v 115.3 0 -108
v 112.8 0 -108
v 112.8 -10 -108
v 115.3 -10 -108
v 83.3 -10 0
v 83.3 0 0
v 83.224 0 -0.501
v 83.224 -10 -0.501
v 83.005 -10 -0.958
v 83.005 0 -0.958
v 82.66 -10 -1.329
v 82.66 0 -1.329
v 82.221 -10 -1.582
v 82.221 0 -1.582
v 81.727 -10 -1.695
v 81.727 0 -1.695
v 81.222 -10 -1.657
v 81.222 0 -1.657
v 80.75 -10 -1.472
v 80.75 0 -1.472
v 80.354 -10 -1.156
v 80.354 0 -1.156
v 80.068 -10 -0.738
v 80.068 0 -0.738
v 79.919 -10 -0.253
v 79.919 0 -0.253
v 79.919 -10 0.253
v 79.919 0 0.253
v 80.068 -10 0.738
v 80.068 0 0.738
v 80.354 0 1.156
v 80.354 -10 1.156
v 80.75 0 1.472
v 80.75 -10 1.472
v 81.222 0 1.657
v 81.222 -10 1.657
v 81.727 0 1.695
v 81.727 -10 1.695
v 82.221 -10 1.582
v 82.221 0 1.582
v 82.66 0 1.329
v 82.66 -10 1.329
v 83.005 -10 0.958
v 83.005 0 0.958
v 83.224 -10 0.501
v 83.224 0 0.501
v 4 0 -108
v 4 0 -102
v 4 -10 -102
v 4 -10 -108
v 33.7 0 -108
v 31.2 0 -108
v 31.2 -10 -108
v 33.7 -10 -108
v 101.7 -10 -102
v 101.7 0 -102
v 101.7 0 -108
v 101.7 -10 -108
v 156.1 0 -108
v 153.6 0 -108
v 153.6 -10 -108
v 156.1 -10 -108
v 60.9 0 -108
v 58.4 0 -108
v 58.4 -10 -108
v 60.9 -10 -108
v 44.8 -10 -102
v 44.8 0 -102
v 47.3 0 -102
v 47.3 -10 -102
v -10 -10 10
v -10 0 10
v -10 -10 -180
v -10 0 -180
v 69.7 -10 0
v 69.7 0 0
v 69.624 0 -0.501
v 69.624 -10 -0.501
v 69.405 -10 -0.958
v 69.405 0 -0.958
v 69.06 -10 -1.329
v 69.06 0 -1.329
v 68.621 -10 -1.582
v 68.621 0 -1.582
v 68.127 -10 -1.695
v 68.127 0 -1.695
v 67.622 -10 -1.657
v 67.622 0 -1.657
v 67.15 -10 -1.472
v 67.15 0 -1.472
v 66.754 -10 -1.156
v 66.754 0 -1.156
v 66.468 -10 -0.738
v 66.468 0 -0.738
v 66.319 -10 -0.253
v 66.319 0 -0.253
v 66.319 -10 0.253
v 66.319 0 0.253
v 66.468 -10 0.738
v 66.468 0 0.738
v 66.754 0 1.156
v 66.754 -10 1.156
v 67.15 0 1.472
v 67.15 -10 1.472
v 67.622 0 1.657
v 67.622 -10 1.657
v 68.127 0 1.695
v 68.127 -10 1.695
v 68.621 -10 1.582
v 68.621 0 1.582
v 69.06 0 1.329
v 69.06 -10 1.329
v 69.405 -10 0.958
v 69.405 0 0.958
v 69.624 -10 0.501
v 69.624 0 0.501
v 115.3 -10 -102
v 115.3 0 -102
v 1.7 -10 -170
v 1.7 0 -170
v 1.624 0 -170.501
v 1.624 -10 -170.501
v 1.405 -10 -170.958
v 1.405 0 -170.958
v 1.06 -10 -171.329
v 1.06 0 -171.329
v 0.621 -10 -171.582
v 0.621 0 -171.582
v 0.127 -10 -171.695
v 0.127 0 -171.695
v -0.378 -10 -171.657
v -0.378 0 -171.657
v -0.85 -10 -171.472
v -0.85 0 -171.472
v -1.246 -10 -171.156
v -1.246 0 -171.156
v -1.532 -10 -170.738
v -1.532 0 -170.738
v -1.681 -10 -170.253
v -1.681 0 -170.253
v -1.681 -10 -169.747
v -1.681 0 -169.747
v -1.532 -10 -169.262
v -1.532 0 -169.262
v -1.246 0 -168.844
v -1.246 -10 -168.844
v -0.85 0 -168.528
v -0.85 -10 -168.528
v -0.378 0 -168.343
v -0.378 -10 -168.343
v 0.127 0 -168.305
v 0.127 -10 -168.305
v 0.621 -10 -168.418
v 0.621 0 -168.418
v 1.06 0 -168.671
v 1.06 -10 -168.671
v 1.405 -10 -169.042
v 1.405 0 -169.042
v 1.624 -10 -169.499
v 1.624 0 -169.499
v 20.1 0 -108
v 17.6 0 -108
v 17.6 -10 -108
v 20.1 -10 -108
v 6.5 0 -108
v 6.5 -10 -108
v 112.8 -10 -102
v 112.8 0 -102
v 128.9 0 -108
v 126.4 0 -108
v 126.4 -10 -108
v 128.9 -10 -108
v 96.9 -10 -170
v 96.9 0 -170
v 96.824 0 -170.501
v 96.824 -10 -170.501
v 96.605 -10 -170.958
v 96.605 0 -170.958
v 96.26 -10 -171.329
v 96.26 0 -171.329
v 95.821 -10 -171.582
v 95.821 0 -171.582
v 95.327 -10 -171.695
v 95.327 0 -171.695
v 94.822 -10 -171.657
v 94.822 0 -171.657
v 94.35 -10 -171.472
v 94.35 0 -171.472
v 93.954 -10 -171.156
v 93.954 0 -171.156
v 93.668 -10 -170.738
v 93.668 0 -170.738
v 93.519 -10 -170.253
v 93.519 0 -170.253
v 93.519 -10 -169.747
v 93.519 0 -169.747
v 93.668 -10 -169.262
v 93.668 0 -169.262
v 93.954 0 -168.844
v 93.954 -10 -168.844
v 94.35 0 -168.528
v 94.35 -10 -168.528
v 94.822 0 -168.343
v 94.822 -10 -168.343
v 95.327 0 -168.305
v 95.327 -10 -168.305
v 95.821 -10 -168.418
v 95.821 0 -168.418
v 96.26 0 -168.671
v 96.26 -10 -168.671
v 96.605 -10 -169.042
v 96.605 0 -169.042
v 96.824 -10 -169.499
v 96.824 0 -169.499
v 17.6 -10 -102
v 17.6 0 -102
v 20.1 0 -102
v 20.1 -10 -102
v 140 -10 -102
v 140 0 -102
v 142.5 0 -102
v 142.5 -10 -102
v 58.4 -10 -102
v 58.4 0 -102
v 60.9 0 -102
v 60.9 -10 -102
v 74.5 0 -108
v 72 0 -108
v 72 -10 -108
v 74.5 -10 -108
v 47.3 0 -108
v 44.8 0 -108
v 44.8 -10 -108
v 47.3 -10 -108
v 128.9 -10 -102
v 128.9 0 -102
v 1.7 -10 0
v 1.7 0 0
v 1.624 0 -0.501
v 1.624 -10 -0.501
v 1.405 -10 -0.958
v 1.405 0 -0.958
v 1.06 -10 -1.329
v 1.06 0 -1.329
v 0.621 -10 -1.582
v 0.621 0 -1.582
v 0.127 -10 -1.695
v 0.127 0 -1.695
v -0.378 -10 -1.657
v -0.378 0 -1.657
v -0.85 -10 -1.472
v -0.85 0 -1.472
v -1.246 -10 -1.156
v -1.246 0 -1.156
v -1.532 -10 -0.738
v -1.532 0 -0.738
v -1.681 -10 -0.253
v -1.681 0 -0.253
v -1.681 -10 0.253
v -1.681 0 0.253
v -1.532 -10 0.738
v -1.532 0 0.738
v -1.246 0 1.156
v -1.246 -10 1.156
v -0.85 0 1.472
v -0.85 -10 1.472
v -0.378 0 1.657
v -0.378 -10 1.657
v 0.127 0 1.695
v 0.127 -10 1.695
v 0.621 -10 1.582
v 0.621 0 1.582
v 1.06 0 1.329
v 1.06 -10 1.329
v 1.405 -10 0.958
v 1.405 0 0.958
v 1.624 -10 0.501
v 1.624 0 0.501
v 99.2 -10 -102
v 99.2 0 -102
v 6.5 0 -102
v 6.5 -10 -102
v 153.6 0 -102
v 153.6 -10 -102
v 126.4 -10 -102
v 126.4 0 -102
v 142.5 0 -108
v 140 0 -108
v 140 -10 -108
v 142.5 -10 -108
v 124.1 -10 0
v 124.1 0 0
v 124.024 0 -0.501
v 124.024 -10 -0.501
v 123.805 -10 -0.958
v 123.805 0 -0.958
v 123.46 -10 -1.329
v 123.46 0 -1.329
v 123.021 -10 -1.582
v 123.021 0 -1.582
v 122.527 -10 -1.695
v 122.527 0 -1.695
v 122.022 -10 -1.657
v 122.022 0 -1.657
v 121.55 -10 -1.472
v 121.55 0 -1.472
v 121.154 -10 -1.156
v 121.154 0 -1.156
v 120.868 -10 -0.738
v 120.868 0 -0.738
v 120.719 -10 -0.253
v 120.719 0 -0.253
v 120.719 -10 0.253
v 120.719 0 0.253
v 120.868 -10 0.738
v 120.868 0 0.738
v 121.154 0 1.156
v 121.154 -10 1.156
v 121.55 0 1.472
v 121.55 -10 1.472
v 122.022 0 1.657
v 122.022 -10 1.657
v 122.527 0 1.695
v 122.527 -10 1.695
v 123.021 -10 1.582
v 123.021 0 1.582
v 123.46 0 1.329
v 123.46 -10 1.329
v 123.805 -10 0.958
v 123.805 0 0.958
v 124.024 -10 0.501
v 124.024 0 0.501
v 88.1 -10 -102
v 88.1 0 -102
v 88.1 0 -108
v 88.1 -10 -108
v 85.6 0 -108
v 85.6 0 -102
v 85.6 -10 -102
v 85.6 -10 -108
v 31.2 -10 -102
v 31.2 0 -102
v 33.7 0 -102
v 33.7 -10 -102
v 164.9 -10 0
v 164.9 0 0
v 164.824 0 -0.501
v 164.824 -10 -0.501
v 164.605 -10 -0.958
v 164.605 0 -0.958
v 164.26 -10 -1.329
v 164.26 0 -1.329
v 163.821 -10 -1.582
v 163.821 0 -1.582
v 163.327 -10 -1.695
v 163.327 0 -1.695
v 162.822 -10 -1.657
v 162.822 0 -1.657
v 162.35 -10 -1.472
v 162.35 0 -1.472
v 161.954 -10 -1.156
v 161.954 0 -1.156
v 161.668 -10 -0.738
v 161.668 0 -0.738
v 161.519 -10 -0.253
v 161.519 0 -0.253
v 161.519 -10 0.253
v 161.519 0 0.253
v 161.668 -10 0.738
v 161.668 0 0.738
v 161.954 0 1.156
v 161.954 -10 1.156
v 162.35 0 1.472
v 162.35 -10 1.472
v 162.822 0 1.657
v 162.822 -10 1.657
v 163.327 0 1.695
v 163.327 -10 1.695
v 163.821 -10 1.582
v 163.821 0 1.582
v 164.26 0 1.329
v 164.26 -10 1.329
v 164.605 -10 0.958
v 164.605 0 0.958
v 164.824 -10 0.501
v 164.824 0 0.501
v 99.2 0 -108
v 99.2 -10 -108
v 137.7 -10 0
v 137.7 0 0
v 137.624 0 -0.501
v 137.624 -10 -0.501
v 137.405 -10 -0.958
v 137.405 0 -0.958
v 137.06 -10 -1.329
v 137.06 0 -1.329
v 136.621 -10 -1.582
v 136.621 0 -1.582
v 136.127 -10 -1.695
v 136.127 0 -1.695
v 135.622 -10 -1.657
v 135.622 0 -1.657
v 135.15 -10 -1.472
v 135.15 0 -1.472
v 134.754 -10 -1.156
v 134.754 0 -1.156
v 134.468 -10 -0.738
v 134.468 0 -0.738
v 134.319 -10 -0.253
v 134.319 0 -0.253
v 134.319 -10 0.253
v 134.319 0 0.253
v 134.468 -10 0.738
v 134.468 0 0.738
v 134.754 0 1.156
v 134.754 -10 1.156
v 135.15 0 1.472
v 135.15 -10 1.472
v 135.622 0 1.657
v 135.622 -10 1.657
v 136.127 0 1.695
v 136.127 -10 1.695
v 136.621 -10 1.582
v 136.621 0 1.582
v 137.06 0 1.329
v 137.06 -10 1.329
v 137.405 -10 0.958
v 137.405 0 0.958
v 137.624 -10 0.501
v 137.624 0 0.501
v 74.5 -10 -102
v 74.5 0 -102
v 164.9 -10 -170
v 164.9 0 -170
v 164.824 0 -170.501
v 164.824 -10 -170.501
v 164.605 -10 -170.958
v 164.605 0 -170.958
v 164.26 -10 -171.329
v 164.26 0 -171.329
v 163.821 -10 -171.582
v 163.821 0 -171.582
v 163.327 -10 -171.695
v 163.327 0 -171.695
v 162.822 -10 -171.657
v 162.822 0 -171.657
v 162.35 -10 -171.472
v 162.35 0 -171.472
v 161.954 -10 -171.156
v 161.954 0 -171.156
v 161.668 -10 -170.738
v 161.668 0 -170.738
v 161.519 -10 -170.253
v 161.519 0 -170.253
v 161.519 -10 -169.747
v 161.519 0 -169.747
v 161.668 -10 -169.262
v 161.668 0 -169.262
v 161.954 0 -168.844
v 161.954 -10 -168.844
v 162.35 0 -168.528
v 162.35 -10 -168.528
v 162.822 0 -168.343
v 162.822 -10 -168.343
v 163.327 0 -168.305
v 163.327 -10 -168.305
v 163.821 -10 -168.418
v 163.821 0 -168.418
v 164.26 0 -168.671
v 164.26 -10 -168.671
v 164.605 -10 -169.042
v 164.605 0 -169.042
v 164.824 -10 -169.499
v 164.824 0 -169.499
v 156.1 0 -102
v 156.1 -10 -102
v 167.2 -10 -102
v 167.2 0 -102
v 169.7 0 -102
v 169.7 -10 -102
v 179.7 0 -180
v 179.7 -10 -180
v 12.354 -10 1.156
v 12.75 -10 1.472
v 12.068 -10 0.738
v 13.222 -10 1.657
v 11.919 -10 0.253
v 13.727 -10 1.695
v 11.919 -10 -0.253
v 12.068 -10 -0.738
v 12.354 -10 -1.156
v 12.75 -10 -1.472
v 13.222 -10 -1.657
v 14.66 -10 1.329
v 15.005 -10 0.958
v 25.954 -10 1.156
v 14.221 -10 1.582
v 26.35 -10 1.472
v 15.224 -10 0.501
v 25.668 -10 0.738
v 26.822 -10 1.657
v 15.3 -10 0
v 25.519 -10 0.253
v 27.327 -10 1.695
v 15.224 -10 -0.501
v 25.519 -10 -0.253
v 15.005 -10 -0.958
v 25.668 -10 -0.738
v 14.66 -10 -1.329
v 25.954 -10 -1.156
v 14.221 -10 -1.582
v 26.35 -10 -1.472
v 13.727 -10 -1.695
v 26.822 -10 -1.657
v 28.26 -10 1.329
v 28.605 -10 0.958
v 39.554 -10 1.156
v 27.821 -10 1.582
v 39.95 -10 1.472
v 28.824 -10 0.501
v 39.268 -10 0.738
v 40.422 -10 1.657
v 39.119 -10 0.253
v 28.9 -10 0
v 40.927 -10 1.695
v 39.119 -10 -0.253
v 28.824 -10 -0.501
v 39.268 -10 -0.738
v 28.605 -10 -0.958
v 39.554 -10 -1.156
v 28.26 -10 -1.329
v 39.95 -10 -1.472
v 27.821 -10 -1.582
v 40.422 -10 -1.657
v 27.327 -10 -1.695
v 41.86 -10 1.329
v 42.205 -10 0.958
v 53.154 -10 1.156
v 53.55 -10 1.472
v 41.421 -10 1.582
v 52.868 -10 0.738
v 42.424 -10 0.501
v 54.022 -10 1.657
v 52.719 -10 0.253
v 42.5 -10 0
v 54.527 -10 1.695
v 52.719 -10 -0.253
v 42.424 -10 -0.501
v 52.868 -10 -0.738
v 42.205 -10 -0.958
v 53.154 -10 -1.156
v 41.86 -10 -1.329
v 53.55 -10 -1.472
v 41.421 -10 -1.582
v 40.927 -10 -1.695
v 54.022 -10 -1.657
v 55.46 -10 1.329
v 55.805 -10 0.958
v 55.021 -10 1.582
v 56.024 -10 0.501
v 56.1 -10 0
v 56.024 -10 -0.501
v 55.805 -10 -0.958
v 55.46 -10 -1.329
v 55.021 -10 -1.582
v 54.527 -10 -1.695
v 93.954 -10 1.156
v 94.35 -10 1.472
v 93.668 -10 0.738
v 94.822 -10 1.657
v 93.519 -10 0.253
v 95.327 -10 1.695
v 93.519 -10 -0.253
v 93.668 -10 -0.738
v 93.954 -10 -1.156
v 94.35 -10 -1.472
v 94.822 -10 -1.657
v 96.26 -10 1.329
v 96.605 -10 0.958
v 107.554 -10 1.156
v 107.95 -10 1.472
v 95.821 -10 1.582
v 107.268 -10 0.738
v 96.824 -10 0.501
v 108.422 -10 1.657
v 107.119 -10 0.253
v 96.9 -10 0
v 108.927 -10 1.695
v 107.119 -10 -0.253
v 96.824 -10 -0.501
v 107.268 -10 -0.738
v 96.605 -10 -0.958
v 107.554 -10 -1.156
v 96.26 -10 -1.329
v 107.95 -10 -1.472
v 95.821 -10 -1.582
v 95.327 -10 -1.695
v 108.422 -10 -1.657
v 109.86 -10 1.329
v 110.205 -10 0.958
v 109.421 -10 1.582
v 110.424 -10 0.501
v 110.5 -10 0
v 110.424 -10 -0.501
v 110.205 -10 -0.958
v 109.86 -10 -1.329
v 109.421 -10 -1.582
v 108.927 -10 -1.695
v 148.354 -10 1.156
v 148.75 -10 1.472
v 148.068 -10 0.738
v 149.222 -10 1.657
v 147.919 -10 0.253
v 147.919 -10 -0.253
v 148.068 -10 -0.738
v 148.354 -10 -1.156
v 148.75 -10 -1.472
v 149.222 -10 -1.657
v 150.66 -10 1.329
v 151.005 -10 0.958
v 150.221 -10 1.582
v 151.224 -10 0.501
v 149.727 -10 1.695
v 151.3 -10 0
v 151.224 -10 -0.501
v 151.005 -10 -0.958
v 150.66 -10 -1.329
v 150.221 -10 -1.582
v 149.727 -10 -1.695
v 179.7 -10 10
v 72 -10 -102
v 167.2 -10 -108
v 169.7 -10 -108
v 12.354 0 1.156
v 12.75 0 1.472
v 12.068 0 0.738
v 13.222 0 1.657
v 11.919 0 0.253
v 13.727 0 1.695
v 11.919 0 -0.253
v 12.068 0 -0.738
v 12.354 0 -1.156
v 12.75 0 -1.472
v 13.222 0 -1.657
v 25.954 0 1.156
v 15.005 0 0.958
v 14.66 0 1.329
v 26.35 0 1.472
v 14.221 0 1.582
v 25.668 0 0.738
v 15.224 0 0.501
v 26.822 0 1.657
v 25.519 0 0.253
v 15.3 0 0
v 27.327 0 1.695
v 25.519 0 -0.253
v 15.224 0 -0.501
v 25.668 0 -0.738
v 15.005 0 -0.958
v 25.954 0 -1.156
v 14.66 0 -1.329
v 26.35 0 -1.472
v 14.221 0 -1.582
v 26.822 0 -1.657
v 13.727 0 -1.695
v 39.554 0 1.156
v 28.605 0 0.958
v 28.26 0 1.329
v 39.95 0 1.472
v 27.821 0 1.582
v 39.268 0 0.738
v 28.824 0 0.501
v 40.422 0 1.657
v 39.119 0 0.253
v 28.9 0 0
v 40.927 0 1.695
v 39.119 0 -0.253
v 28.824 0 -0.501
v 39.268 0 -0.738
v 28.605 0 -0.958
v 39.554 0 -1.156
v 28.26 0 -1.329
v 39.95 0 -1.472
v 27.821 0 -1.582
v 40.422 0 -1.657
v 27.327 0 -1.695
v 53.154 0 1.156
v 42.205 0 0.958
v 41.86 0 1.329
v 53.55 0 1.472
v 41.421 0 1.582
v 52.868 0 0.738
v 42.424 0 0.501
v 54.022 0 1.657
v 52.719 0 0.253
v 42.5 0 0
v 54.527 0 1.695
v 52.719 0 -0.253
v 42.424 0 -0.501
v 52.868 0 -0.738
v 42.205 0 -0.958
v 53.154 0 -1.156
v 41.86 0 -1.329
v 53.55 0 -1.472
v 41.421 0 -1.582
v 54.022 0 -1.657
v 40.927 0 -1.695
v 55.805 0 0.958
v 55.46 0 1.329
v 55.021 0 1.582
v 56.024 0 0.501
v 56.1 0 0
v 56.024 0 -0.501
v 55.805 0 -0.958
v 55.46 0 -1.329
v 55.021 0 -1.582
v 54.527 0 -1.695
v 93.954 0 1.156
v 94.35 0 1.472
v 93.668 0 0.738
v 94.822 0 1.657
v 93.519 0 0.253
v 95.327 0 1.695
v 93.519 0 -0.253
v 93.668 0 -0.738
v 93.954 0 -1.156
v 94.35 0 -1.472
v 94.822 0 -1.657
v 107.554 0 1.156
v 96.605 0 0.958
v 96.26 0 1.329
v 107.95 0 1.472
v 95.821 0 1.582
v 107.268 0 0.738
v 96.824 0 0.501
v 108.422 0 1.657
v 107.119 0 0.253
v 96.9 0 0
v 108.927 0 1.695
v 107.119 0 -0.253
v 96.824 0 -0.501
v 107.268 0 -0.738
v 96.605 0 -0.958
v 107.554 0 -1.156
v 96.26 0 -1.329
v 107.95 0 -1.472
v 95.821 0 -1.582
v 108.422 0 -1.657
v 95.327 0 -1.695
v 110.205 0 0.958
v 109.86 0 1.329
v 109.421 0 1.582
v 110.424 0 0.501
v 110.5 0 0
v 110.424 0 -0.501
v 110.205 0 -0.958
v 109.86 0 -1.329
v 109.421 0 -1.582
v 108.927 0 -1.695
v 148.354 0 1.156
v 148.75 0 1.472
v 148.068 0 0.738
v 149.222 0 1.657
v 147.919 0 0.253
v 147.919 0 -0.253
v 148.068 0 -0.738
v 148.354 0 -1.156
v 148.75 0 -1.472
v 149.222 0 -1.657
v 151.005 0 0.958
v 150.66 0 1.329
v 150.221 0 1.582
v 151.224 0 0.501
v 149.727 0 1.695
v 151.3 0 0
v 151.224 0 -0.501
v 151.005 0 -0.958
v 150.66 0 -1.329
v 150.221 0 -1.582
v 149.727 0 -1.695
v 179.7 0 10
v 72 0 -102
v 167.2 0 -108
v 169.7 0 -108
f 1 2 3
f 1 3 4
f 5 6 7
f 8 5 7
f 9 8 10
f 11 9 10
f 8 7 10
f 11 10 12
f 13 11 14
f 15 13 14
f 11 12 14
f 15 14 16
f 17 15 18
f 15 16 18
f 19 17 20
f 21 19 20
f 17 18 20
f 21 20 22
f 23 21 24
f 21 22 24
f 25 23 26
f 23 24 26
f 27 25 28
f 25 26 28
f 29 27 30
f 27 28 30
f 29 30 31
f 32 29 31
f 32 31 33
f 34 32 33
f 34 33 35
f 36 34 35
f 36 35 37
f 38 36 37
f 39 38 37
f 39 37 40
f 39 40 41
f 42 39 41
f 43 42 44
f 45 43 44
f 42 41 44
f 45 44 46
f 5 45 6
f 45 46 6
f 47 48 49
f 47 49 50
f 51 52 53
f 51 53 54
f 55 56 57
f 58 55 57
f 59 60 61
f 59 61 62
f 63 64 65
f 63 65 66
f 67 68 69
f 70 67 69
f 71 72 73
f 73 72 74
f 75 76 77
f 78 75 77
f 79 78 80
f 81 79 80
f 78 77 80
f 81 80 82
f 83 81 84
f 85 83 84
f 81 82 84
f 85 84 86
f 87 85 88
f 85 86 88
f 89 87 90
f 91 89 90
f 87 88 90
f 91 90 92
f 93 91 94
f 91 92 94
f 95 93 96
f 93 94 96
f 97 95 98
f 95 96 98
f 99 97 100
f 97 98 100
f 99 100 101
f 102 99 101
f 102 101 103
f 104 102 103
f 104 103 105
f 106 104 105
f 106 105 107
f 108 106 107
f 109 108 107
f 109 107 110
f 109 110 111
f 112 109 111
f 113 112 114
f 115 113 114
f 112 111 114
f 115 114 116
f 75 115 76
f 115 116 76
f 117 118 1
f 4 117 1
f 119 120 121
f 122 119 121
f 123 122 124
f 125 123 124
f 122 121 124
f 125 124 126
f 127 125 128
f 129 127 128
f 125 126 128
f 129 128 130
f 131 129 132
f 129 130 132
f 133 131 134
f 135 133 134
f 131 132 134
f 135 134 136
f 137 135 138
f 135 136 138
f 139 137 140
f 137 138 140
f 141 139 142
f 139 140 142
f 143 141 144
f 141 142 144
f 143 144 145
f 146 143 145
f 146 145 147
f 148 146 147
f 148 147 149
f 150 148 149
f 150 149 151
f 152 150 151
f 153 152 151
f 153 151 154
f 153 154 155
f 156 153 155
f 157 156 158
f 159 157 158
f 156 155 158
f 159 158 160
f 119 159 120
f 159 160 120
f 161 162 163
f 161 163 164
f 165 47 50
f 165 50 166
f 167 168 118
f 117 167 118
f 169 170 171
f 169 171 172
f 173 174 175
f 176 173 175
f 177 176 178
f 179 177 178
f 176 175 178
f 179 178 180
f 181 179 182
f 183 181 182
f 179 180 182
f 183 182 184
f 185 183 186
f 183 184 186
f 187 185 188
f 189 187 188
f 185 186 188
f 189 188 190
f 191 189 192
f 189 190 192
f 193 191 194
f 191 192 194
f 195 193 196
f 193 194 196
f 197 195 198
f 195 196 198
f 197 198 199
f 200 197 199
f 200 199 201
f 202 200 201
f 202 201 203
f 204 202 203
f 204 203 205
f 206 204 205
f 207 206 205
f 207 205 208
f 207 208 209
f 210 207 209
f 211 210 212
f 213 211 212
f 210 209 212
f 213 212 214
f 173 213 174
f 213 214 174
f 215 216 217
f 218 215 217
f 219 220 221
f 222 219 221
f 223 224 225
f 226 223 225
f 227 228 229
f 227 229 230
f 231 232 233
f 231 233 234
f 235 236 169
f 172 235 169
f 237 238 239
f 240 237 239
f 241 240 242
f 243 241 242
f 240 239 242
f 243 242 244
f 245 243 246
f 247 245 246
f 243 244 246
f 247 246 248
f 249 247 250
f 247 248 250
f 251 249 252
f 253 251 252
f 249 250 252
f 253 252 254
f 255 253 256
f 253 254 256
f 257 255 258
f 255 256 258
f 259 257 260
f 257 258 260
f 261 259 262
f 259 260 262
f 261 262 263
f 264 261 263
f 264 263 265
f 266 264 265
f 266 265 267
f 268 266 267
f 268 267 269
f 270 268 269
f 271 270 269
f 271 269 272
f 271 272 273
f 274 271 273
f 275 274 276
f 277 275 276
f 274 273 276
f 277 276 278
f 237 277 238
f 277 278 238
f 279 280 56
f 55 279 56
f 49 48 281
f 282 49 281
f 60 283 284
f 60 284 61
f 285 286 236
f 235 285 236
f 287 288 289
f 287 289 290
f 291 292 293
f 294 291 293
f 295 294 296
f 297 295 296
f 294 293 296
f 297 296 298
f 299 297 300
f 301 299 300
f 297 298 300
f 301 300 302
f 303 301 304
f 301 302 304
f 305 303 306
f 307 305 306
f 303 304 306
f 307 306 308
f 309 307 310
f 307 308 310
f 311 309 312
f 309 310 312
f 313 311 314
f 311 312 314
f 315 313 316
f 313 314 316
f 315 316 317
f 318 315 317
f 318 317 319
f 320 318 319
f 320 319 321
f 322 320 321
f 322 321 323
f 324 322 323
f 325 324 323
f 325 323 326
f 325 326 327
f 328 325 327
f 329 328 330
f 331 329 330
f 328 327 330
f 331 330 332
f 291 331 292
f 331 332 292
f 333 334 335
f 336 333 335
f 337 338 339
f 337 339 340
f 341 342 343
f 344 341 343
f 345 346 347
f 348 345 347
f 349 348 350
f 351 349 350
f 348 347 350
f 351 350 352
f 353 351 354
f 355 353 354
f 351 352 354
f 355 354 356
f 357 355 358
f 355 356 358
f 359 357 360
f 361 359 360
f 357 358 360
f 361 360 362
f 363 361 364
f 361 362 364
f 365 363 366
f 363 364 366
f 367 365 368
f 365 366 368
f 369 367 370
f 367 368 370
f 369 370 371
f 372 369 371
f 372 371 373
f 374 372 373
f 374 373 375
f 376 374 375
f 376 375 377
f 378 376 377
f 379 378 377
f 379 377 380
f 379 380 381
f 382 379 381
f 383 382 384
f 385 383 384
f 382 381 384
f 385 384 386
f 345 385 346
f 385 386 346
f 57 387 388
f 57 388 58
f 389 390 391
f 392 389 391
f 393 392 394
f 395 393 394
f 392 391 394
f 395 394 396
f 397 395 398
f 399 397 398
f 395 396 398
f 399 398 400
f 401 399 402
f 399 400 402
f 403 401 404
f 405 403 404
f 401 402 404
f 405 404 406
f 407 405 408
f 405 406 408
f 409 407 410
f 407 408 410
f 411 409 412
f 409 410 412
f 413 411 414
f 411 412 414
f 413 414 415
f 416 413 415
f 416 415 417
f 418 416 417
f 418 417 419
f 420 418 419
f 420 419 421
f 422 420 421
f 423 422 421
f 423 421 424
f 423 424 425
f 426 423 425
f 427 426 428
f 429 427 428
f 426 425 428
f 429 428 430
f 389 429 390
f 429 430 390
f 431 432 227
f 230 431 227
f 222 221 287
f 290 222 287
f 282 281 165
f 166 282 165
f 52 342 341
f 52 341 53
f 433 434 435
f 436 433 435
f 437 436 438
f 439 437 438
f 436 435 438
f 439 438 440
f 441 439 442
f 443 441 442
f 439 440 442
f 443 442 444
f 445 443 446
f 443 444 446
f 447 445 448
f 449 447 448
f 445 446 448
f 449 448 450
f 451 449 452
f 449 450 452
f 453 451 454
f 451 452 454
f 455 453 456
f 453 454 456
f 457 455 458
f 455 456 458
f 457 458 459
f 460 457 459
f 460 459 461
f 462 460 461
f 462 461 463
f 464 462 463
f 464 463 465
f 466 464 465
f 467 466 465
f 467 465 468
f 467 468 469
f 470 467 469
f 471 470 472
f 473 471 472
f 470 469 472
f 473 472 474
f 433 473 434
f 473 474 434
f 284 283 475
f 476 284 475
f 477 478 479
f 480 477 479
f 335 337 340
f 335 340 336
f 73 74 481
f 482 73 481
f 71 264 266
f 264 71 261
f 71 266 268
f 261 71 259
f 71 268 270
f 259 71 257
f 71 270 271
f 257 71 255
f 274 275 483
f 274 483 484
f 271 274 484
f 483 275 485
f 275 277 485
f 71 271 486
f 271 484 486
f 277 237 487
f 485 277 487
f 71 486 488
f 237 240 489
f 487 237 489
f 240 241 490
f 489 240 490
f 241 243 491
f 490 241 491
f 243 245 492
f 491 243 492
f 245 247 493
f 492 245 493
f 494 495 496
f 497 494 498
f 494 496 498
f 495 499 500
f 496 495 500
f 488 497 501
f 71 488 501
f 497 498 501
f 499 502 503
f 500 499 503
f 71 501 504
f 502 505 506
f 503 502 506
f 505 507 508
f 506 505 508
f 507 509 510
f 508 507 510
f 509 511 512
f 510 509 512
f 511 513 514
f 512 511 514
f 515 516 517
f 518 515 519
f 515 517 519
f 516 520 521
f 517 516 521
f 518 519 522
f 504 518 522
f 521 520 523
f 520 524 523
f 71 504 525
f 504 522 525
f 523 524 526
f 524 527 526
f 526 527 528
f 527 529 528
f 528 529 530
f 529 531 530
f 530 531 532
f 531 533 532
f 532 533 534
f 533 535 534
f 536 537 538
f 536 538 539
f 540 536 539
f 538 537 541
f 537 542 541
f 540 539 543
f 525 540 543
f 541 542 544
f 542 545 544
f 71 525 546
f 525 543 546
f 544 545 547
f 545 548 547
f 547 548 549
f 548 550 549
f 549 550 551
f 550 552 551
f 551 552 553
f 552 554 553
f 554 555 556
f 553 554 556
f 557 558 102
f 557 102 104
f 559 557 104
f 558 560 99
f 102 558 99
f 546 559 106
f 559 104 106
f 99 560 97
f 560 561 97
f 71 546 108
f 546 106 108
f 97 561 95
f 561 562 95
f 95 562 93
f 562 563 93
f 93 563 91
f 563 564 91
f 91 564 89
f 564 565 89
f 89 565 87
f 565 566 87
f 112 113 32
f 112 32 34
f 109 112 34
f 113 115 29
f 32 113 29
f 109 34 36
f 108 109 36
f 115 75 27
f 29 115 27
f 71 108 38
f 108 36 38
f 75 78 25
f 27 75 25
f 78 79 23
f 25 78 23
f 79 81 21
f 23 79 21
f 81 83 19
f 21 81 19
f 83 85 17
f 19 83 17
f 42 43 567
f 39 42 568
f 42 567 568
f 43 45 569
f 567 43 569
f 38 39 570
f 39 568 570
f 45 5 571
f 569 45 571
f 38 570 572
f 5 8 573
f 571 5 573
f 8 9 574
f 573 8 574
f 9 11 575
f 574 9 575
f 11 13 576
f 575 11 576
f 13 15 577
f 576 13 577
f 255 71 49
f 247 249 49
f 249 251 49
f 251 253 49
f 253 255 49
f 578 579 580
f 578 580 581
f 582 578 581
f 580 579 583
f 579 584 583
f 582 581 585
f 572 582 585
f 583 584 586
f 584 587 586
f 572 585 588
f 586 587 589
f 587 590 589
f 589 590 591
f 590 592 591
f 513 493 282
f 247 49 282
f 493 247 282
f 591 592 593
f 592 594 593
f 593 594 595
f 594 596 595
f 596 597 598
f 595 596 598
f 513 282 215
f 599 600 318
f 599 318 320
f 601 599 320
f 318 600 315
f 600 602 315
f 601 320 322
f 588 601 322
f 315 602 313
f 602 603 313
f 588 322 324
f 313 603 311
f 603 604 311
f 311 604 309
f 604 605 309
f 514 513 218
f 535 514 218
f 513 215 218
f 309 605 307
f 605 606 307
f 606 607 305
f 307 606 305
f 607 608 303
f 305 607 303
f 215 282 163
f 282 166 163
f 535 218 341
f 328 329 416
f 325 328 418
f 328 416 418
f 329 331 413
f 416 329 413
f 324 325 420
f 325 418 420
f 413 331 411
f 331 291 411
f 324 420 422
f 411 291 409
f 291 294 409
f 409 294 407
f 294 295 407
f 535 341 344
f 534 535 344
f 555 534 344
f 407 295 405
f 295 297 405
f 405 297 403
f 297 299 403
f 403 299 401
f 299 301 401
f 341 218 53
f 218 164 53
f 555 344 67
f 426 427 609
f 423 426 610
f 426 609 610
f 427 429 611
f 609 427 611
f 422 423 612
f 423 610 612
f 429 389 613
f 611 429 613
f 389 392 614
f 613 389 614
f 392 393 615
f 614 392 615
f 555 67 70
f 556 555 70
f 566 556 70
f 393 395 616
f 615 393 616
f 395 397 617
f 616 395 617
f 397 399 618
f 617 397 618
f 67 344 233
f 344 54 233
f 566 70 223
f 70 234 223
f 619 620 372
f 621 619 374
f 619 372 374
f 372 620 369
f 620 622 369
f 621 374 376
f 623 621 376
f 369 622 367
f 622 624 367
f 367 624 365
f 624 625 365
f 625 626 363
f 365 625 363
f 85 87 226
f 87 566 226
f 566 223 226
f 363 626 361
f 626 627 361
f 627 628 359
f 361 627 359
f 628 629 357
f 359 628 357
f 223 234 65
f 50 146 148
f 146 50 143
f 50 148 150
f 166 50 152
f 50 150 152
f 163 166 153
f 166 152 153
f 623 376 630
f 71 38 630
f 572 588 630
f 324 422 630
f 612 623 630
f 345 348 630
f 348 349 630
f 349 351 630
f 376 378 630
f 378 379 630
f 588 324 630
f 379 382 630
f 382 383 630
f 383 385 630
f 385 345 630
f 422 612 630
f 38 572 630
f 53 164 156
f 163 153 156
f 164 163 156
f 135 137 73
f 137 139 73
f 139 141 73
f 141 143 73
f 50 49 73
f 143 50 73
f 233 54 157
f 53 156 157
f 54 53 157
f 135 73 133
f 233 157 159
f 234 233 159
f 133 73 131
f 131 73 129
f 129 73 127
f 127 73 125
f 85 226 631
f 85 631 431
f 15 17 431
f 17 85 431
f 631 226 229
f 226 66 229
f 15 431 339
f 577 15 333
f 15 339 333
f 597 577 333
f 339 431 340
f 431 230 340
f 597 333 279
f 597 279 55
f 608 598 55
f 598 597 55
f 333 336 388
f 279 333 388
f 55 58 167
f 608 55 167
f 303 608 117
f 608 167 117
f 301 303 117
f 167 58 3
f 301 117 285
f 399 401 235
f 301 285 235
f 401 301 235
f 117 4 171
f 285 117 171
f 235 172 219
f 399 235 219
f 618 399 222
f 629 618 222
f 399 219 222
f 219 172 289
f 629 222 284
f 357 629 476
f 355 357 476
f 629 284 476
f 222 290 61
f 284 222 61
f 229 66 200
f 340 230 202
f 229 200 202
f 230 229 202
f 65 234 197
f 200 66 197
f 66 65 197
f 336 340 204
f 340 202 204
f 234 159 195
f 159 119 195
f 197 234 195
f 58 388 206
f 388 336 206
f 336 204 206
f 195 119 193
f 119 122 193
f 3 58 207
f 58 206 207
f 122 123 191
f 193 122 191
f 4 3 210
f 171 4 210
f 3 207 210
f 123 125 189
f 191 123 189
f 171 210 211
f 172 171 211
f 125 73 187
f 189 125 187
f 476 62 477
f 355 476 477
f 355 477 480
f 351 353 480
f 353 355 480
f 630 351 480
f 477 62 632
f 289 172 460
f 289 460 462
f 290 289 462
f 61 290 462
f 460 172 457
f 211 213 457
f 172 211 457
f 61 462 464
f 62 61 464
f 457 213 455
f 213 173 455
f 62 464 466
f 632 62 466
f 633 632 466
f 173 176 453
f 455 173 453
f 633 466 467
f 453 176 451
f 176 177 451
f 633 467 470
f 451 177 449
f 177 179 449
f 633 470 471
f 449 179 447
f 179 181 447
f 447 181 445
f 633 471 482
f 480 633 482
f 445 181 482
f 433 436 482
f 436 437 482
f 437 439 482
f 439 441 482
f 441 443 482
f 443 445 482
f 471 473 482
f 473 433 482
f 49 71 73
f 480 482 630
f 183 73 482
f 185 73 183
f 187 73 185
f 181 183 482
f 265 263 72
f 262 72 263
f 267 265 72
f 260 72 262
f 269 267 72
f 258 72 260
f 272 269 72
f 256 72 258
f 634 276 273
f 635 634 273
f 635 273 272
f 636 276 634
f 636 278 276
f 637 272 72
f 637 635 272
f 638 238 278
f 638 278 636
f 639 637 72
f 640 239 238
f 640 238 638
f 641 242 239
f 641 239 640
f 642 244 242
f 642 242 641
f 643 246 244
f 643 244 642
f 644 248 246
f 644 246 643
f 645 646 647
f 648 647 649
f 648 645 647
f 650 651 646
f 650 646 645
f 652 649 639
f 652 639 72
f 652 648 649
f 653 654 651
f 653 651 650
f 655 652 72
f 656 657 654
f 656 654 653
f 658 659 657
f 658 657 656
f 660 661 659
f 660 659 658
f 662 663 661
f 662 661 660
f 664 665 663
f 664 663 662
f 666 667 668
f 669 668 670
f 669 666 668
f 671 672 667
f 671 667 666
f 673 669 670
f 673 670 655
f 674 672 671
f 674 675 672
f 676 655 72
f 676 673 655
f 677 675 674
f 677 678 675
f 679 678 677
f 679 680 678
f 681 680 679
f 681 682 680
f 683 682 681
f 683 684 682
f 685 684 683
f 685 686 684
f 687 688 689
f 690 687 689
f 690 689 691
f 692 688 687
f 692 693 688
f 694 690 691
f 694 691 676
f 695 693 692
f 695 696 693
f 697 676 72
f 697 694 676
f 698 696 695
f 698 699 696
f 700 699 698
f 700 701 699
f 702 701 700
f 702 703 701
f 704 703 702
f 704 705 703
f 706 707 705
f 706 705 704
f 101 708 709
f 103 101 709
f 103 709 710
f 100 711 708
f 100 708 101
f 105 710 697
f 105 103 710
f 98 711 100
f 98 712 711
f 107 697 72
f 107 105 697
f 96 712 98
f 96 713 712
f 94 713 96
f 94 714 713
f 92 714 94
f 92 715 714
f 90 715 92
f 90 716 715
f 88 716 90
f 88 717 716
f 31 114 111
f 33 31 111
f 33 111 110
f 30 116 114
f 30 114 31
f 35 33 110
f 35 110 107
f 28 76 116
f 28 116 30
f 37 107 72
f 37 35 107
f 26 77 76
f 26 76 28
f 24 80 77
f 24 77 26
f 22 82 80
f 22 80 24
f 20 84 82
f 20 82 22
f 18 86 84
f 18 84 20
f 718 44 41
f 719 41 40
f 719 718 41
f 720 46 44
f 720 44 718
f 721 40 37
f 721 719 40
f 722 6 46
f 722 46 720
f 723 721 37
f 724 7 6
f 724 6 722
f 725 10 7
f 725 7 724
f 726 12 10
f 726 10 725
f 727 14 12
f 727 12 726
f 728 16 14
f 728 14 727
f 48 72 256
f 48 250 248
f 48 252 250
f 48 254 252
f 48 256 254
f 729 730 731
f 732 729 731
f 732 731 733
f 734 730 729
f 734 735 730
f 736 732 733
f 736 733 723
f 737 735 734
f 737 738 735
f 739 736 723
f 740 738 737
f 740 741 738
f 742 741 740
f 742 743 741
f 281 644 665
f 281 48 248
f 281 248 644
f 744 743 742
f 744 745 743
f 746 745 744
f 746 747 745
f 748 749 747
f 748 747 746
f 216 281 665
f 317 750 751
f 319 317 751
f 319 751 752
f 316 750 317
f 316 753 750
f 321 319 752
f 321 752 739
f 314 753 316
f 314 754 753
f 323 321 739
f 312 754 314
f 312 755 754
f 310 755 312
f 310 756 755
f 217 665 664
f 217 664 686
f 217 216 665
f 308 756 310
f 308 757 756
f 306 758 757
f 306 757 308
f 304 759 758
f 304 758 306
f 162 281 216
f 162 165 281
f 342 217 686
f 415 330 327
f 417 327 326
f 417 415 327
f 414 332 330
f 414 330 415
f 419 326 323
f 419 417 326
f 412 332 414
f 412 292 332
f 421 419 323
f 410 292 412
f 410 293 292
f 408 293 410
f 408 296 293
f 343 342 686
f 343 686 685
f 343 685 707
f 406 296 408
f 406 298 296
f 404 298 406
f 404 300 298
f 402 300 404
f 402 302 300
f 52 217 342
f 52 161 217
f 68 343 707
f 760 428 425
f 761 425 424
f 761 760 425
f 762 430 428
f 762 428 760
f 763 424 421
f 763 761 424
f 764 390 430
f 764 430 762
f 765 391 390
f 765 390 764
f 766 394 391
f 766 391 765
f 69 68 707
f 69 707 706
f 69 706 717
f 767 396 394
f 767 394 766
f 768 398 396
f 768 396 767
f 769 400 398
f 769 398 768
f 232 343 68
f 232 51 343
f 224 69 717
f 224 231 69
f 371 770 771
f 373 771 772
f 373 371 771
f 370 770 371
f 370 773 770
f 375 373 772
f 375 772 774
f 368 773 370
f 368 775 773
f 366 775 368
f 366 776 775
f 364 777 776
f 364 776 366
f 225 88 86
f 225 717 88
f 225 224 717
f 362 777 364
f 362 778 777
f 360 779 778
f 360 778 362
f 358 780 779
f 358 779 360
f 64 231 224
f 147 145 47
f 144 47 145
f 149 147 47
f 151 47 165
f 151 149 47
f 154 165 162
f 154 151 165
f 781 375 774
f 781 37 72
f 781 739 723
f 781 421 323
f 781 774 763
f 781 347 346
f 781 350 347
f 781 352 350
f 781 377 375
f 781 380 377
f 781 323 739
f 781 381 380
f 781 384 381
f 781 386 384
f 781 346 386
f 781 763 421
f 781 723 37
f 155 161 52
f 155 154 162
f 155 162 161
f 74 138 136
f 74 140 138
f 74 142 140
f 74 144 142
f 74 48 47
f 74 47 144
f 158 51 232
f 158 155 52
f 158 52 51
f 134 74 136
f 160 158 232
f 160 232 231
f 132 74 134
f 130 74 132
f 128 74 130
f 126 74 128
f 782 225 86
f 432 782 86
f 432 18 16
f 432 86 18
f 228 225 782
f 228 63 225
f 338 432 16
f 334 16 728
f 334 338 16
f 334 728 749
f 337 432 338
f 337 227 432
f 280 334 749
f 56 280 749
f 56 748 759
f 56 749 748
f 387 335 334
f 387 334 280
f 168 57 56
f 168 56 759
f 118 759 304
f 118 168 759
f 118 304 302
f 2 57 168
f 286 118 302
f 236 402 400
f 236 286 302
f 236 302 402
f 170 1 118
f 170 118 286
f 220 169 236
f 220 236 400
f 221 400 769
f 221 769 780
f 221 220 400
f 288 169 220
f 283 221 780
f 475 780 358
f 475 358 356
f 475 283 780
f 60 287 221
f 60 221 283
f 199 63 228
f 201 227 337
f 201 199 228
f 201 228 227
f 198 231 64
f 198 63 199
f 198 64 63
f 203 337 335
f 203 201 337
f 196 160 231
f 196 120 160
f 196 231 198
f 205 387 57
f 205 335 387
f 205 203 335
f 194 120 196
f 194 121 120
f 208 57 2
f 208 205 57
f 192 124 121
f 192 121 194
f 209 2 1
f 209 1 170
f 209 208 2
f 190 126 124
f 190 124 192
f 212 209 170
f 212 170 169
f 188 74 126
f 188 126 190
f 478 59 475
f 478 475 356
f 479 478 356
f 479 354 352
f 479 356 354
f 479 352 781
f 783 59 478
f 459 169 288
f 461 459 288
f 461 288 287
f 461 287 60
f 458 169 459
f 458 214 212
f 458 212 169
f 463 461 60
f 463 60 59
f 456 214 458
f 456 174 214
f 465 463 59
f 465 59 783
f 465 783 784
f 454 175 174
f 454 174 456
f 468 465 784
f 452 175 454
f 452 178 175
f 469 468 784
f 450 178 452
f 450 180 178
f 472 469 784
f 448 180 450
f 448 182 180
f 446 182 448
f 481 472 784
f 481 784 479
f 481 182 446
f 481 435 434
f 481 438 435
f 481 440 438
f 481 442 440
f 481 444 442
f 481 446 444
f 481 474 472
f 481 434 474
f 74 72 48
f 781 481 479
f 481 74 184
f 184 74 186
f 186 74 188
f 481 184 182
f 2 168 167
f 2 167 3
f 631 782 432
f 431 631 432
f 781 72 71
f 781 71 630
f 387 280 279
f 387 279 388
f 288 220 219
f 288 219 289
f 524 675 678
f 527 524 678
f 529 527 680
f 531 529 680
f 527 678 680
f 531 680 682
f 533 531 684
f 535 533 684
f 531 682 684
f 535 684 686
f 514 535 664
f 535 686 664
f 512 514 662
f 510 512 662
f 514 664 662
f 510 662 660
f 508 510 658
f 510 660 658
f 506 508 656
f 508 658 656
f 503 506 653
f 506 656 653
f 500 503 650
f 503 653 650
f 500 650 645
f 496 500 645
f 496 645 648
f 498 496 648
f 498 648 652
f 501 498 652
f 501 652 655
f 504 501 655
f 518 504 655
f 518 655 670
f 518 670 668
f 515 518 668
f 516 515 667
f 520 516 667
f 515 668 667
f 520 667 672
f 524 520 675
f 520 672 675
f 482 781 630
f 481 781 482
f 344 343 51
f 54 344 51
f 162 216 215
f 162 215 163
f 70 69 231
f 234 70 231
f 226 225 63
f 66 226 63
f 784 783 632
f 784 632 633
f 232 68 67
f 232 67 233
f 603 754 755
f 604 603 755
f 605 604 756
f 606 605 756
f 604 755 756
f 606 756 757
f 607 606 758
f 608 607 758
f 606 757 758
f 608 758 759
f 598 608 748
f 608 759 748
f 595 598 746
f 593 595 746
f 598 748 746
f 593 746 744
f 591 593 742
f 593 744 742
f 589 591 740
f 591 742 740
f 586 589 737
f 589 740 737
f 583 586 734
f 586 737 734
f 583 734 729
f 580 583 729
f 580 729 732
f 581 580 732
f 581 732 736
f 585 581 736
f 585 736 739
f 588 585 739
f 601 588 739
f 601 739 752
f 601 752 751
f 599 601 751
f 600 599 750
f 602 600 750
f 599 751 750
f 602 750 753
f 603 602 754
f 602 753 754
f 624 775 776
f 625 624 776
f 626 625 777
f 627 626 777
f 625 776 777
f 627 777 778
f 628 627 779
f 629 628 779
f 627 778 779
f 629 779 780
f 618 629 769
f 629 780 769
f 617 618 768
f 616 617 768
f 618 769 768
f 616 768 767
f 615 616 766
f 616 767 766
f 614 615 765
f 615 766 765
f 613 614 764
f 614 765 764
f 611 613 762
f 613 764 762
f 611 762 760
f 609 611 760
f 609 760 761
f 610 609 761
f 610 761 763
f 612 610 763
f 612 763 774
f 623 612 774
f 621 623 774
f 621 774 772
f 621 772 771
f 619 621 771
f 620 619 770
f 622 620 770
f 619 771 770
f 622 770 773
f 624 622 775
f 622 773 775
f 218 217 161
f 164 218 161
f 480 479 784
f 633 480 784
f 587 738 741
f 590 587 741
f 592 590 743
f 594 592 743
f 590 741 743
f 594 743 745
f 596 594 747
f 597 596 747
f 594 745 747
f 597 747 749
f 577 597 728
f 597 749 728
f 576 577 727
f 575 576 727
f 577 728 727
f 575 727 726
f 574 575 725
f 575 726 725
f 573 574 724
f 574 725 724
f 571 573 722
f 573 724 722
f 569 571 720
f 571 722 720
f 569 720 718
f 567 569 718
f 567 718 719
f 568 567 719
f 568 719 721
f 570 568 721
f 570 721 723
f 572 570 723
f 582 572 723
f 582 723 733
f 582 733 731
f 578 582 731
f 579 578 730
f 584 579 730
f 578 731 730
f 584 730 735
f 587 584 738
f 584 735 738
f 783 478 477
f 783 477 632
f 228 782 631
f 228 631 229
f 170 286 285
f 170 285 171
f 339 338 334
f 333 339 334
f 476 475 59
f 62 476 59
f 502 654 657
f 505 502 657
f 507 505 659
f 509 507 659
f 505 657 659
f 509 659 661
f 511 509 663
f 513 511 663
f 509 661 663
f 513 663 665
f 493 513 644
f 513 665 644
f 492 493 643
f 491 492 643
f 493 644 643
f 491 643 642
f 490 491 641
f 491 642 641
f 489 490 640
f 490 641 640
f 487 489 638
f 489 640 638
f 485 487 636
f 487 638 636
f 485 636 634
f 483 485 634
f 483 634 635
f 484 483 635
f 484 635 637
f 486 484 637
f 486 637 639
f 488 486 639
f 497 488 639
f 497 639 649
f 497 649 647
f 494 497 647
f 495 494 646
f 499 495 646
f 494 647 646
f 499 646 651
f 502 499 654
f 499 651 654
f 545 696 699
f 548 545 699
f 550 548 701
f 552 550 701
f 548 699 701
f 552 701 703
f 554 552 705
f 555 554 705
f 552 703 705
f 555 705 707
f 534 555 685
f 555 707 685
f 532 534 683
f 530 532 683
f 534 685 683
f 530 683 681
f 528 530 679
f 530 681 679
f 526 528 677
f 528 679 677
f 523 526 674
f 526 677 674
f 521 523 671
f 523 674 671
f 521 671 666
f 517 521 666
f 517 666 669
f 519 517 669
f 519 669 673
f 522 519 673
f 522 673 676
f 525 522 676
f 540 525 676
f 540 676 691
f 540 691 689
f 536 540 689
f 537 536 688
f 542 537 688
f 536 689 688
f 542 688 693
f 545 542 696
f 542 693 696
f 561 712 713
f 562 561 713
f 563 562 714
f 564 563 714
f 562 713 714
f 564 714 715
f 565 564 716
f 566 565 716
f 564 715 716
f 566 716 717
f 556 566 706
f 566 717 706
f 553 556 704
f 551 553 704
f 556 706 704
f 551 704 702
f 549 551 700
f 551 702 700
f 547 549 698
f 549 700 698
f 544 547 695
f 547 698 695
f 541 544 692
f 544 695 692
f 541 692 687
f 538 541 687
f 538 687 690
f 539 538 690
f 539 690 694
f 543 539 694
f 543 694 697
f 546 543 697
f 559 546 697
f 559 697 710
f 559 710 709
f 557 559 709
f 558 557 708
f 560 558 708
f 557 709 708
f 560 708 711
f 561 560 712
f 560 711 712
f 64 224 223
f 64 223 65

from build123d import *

# Parameters (mm, degrees)
SKETCH1_W           = 189.7
SKETCH1_H           = 190
SKETCH1_R           = 1.7
SKETCH1_W_2         = 2.5
SKETCH1_H_2         = 6
BOSS_EXTRUDE1_DEPTH = 10


with BuildPart() as part:
    # Sketch1 → Boss-Extrude1 (new body)
    with BuildSketch(Plane(origin=(0, 0, 0), x_dir=(1, 0, 0), z_dir=(0, 1, 0))):
        with Locations((84.85, 85)):
            Rectangle(SKETCH1_W, SKETCH1_H)
        Circle(SKETCH1_R, mode=Mode.SUBTRACT)
        with Locations((0, 170)):
            Circle(SKETCH1_R, mode=Mode.SUBTRACT)
        with Locations((13.6, 0)):
            Circle(SKETCH1_R, mode=Mode.SUBTRACT)
        with Locations((27.2, 0)):
            Circle(SKETCH1_R, mode=Mode.SUBTRACT)
        with Locations((40.8, 0)):
            Circle(SKETCH1_R, mode=Mode.SUBTRACT)
        with Locations((54.4, 0)):
            Circle(SKETCH1_R, mode=Mode.SUBTRACT)
        with Locations((68, 0)):
            Circle(SKETCH1_R, mode=Mode.SUBTRACT)
        with Locations((81.6, 0)):
            Circle(SKETCH1_R, mode=Mode.SUBTRACT)
        with Locations((95.2, 0)):
            Circle(SKETCH1_R, mode=Mode.SUBTRACT)
        with Locations((108.8, 0)):
            Circle(SKETCH1_R, mode=Mode.SUBTRACT)
        with Locations((122.4, 0)):
            Circle(SKETCH1_R, mode=Mode.SUBTRACT)
        with Locations((136, 0)):
            Circle(SKETCH1_R, mode=Mode.SUBTRACT)
        with Locations((149.6, 0)):
            Circle(SKETCH1_R, mode=Mode.SUBTRACT)
        with Locations((163.2, 0)):
            Circle(SKETCH1_R, mode=Mode.SUBTRACT)
        with Locations((95.2, 170)):
            Circle(SKETCH1_R, mode=Mode.SUBTRACT)
        with Locations((163.2, 170)):
            Circle(SKETCH1_R, mode=Mode.SUBTRACT)
        with Locations((5.25, 105)):
            Rectangle(SKETCH1_W_2, SKETCH1_H_2, mode=Mode.SUBTRACT)
        with Locations((18.85, 105)):
            Rectangle(SKETCH1_W_2, SKETCH1_H_2, mode=Mode.SUBTRACT)
        with Locations((32.45, 105)):
            Rectangle(SKETCH1_W_2, SKETCH1_H_2, mode=Mode.SUBTRACT)
        with Locations((46.05, 105)):
            Rectangle(SKETCH1_W_2, SKETCH1_H_2, mode=Mode.SUBTRACT)
        with Locations((59.65, 105)):
            Rectangle(SKETCH1_W_2, SKETCH1_H_2, mode=Mode.SUBTRACT)
        with Locations((73.25, 105)):
            Rectangle(SKETCH1_W_2, SKETCH1_H_2, mode=Mode.SUBTRACT)
        with Locations((86.85, 105)):
            Rectangle(SKETCH1_W_2, SKETCH1_H_2, mode=Mode.SUBTRACT)
        with Locations((100.45, 105)):
            Rectangle(SKETCH1_W_2, SKETCH1_H_2, mode=Mode.SUBTRACT)
        with Locations((114.05, 105)):
            Rectangle(SKETCH1_W_2, SKETCH1_H_2, mode=Mode.SUBTRACT)
        with Locations((127.65, 105)):
            Rectangle(SKETCH1_W_2, SKETCH1_H_2, mode=Mode.SUBTRACT)
        with Locations((141.25, 105)):
            Rectangle(SKETCH1_W_2, SKETCH1_H_2, mode=Mode.SUBTRACT)
        with Locations((154.85, 105)):
            Rectangle(SKETCH1_W_2, SKETCH1_H_2, mode=Mode.SUBTRACT)
        with Locations((168.45, 105)):
            Rectangle(SKETCH1_W_2, SKETCH1_H_2, mode=Mode.SUBTRACT)
    extrude(amount=-BOSS_EXTRUDE1_DEPTH)


solid = part.part
